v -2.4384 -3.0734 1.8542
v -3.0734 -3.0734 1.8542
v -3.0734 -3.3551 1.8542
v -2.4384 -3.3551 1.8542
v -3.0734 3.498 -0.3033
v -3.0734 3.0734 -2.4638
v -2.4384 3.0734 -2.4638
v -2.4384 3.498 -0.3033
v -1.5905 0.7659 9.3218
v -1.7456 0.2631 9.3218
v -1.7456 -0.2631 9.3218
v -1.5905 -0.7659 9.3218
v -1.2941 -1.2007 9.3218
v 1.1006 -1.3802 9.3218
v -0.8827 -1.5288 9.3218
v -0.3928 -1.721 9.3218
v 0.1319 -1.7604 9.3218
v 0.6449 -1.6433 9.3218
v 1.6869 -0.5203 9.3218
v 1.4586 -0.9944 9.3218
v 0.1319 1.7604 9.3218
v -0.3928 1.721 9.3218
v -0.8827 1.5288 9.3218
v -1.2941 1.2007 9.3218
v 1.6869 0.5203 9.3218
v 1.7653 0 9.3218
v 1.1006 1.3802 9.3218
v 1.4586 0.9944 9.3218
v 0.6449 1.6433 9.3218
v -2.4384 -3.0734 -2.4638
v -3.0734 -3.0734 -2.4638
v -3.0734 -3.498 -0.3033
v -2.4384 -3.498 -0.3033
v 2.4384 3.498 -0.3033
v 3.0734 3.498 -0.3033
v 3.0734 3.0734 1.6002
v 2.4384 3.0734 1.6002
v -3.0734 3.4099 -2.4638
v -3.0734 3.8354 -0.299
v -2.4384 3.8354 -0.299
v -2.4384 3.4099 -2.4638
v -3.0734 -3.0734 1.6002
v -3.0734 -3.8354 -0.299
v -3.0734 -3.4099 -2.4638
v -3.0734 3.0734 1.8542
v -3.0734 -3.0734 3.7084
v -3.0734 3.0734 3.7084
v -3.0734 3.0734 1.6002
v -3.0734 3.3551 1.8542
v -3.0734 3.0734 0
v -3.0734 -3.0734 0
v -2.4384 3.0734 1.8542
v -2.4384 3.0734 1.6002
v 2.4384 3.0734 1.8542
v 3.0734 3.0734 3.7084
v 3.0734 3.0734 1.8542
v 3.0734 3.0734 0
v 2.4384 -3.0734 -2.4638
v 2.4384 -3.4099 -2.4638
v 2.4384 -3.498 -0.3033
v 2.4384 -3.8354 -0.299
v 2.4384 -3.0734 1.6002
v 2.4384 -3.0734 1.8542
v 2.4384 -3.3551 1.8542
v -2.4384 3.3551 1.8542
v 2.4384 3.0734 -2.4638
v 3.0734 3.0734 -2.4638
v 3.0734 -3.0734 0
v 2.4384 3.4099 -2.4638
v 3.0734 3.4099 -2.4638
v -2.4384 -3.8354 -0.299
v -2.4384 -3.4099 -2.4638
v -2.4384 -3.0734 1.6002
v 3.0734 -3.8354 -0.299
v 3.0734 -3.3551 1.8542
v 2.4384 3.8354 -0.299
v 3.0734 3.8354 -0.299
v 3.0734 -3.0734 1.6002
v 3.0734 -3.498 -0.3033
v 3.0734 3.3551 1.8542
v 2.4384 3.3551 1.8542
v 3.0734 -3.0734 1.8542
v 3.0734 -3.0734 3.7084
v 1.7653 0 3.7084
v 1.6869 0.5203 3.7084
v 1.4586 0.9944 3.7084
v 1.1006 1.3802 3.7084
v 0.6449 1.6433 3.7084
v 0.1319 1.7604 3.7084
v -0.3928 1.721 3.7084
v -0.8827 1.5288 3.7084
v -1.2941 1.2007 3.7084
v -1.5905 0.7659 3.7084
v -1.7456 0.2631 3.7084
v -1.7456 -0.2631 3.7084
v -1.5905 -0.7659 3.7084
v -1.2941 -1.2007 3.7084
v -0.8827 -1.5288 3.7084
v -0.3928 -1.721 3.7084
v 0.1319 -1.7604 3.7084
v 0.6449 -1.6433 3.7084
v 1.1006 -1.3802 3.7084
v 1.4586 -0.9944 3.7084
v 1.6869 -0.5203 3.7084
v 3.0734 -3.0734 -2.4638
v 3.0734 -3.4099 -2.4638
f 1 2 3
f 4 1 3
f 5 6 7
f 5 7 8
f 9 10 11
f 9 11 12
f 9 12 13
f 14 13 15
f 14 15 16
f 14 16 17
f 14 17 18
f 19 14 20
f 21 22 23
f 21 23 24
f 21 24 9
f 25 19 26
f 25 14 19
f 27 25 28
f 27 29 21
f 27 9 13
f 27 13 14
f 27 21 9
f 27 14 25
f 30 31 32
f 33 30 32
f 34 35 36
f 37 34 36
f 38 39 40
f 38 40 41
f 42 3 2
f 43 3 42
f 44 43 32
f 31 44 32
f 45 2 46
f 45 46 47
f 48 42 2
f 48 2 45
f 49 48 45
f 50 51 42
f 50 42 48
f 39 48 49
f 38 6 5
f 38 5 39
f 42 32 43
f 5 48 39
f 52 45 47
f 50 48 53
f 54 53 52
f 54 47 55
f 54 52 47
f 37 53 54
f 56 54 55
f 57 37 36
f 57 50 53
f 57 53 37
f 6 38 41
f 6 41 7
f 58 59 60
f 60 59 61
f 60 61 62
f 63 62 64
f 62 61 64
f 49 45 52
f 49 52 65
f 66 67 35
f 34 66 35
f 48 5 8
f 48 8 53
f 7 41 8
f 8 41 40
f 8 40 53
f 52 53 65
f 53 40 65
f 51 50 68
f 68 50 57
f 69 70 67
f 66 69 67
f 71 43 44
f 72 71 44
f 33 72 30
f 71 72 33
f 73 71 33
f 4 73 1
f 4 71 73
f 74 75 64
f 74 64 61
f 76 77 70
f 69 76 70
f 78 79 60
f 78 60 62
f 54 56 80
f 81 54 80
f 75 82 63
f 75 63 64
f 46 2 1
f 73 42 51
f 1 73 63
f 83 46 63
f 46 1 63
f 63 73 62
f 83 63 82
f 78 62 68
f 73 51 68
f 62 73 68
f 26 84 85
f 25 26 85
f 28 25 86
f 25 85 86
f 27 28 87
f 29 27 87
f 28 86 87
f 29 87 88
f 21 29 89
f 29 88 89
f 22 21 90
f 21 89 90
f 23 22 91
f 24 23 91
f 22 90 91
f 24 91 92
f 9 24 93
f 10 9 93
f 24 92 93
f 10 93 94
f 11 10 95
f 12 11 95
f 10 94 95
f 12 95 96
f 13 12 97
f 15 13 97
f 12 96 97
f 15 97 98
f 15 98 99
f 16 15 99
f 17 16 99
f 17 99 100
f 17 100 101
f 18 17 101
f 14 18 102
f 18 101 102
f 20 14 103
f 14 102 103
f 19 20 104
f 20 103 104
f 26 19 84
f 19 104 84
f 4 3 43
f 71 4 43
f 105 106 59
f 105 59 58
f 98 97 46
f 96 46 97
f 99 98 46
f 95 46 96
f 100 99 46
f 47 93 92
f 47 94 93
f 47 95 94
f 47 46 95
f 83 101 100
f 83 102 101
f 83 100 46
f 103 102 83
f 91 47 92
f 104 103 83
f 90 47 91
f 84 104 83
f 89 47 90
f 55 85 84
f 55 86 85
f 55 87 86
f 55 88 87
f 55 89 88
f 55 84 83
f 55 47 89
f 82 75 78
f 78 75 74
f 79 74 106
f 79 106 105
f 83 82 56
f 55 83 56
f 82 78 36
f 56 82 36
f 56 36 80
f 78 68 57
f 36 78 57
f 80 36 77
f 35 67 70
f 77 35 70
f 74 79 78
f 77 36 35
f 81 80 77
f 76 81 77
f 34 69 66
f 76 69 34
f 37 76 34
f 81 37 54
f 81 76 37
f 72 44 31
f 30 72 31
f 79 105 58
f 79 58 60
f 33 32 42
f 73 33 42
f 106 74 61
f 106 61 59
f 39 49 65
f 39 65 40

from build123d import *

# Parameters (mm, degrees)
SKETCH1_W            = 6.1468
SKETCH1_H            = 6.1468
BOSS_EXTRUDE1_DEPTH  = 3.7084
SKETCH2_R            = 1.7653
BOSS_EXTRUDE2_DEPTH  = 5.6134
BOSS_EXTRUDE3_DEPTH  = 0.635
MIRROR2_COPY_1_DEPTH = 0.635


with BuildPart() as part:
    # Sketch1 → Boss-Extrude1 (new body)
    with BuildSketch(Plane.XY):
        Rectangle(SKETCH1_W, SKETCH1_H)
    extrude(amount=BOSS_EXTRUDE1_DEPTH)

    # Sketch2 → Boss-Extrude2 (add)
    with BuildSketch(Plane.XY.offset(3.7084)):
        Circle(SKETCH2_R)
    extrude(amount=BOSS_EXTRUDE2_DEPTH)

    # Sketch3 → Boss-Extrude3 (add)
    with BuildSketch(Plane.ZY.offset(3.0734)):
        Polygon((1.8542, 3.0734), (1.8542, 3.355054083), (-0.299045368, 3.8354), (-2.4638, 3.409917683), (-2.4638, 3.0734), (-0.303331796, 3.49803982), (1.6002, 3.0734), align=None)
    boss_extrude3 = extrude(amount=-BOSS_EXTRUDE3_DEPTH)

    # Mirror1: Boss-Extrude3 across plane
    add(boss_extrude3.mirror(Plane.ZY))

    # Mirror2: Boss-Extrude3 across plane
    add(boss_extrude3.mirror(Plane.ZX))

    # Mirror2 copy 1 sketch → Mirror2 copy 1 (add)
    with BuildSketch(Plane(origin=(3.0734, 0, 0), x_dir=(0, 0, 1), z_dir=(1, 0, 0))):
        Polygon((1.8542, 3.0734), (1.8542, 3.355054083), (-0.299045368, 3.8354), (-2.4638, 3.409917683), (-2.4638, 3.0734), (-0.303331796, 3.49803982), (1.6002, 3.0734), align=None)
    extrude(amount=-MIRROR2_COPY_1_DEPTH)


solid = part.part
